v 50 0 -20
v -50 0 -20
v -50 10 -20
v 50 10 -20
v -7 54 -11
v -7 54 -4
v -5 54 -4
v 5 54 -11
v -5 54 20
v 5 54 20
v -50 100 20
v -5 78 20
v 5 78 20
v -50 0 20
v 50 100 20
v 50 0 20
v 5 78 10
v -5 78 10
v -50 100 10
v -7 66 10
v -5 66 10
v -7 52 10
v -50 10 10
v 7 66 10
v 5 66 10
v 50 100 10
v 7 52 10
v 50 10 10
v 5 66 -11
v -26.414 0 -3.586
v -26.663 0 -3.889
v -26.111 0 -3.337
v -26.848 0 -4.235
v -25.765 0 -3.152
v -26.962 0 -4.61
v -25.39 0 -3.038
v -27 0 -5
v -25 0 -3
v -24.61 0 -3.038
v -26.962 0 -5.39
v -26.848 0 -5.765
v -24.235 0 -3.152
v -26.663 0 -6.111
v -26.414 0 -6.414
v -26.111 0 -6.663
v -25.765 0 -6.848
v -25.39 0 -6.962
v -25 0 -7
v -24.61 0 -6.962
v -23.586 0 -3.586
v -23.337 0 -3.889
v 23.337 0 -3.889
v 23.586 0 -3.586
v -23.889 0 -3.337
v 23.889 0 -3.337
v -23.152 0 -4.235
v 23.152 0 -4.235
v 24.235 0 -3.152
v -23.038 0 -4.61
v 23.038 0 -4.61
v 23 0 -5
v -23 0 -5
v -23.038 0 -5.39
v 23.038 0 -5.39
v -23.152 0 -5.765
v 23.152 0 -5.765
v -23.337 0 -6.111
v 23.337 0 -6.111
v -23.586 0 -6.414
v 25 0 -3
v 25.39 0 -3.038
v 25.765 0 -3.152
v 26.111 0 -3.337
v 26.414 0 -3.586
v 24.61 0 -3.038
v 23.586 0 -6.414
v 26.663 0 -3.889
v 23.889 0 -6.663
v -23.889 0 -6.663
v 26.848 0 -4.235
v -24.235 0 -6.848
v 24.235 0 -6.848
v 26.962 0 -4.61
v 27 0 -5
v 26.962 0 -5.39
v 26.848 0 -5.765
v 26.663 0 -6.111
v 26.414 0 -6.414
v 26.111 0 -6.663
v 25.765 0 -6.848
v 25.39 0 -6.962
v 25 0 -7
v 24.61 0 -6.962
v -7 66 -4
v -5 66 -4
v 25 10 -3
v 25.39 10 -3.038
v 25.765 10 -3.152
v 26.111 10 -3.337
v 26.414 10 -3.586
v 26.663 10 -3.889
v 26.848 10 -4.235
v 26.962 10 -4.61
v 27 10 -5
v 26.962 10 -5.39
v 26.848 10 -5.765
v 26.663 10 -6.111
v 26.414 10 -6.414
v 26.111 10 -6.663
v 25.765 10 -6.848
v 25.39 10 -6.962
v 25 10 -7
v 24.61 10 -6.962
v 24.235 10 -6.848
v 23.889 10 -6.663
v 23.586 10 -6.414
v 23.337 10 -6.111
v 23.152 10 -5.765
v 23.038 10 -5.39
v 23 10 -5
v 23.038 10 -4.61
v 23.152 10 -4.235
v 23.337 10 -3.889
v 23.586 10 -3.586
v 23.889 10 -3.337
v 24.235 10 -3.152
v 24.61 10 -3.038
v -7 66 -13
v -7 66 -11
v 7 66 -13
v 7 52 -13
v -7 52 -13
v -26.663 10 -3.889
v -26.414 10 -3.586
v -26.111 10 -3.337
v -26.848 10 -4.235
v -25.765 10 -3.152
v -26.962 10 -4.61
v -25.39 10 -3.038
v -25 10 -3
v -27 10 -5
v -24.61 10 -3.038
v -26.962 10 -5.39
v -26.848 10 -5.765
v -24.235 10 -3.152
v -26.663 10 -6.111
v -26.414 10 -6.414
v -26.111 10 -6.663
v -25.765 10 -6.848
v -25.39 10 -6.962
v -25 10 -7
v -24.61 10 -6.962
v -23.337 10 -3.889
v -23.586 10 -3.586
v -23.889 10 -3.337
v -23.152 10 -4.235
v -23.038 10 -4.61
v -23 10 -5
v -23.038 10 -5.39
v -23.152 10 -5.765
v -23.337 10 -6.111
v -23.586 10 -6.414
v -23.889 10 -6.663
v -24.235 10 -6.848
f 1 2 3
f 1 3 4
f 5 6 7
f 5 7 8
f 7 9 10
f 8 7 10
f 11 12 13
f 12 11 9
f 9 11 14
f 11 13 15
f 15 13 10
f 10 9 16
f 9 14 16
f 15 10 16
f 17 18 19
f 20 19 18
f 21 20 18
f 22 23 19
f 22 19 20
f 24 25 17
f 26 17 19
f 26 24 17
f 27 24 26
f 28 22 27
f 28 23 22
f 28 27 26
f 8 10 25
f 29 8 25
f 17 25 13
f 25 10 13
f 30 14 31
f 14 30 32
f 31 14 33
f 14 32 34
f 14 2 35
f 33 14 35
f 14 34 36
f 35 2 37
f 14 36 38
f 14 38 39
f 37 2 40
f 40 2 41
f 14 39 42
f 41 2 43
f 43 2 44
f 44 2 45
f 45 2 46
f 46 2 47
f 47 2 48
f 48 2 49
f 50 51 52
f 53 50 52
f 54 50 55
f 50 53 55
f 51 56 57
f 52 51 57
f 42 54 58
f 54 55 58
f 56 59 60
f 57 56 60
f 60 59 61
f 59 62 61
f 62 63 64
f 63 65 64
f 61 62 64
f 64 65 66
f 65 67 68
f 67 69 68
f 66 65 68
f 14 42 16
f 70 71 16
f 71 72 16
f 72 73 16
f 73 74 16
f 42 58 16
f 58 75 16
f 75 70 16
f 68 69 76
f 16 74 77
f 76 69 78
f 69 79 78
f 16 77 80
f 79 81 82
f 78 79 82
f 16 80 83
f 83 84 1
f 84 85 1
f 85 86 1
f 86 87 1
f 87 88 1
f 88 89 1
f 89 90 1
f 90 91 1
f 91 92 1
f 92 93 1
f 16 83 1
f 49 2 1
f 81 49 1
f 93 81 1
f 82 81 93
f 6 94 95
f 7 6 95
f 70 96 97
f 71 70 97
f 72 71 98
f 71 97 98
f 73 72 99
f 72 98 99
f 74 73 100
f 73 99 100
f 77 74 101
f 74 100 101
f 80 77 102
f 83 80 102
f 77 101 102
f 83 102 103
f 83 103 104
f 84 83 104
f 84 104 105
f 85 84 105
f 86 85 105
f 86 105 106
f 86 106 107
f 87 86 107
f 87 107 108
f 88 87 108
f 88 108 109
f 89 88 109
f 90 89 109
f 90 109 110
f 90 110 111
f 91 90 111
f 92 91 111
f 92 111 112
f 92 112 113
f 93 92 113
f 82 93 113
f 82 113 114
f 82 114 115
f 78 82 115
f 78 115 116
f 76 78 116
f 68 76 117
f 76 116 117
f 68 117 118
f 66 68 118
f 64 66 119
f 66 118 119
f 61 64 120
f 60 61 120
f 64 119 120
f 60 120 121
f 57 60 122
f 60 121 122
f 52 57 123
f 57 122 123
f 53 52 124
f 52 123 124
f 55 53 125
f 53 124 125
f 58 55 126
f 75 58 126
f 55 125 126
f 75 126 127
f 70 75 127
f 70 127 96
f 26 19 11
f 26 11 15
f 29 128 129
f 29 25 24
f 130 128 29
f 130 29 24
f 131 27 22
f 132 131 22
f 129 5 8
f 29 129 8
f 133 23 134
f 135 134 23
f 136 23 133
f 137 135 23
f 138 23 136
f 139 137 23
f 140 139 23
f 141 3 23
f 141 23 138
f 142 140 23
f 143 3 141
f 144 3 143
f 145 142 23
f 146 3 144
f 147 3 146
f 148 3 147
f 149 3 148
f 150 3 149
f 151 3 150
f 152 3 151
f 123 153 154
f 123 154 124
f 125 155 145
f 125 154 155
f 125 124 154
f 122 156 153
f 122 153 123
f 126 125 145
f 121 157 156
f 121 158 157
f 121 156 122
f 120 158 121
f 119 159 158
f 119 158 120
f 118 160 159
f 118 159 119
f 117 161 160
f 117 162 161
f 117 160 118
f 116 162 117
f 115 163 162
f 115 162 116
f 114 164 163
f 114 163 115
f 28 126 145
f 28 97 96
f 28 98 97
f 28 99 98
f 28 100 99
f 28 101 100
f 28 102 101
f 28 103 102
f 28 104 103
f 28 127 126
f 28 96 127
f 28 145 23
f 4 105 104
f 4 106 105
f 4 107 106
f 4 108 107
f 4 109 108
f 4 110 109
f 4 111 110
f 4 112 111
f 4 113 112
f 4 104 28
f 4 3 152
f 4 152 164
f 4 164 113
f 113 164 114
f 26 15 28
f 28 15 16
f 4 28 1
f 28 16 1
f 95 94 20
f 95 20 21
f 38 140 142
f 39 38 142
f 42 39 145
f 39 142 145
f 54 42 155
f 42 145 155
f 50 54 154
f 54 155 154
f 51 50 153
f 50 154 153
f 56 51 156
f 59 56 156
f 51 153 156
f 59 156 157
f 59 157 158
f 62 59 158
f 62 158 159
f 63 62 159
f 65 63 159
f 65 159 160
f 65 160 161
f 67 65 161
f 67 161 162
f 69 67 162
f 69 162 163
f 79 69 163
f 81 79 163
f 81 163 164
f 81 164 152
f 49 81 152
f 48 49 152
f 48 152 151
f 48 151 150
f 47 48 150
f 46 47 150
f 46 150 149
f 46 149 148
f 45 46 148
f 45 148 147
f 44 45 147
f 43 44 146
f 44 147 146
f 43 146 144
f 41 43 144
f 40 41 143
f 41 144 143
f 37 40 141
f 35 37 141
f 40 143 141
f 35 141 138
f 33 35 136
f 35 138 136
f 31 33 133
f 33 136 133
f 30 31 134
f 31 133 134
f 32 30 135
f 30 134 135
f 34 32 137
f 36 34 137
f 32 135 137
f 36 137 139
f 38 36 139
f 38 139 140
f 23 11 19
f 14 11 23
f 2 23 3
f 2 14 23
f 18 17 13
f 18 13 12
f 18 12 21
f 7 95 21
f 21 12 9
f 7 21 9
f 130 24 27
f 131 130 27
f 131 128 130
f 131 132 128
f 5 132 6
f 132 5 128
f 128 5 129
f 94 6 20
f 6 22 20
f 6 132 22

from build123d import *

# Parameters (mm, degrees)
SKETCH3_W           = 100
SKETCH3_H           = 40
BOSS_EXTRUDE1_DEPTH = 10
SKETCH4_W           = 100
SKETCH4_H           = 10
BOSS_EXTRUDE2_DEPTH = 90
SKETCH5_R           = 2
CUT_EXTRUDE1_DEPTH  = 90
SKETCH7_W           = 10
SKETCH7_H           = 12
CUT_EXTRUDE3_DEPTH  = 10
BOSS_EXTRUDE3_DEPTH = 23
SKETCH9_W           = 10
SKETCH9_H           = 2
BOSS_EXTRUDE5_DEPTH = 12
SKETCH12_W          = 2
SKETCH12_H          = 7
CUT_EXTRUDE6_DEPTH  = 12
SKETCH13_W          = 10
SKETCH13_H          = 12
CUT_EXTRUDE7_DEPTH  = 10


with BuildPart() as part:
    # Sketch3 → Boss-Extrude1 (new body)
    with BuildSketch(Plane(origin=(0, 0, 0), x_dir=(1, 0, 0), z_dir=(0, 1, 0))):
        Rectangle(SKETCH3_W, SKETCH3_H)
    extrude(amount=BOSS_EXTRUDE1_DEPTH)

    # Sketch4 → Boss-Extrude2 (add)
    with BuildSketch(Plane(origin=(0, 10, 0), x_dir=(1, 0, 0), z_dir=(0, 1, 0))):
        with Locations((0, -15)):
            Rectangle(SKETCH4_W, SKETCH4_H)
    extrude(amount=BOSS_EXTRUDE2_DEPTH)

    # Sketch5 → Cut-Extrude1 (cut)
    with BuildSketch(Plane(origin=(0, 10, 0), x_dir=(1, 0, 0), z_dir=(0, 1, 0))):
        with Locations(Location((-25, 5, 0), (0, 0, 270))):
            Circle(SKETCH5_R)
        with Locations(Location((25, 5, 0), (0, 0, 270))):
            Circle(SKETCH5_R)
    extrude(amount=-CUT_EXTRUDE1_DEPTH, mode=Mode.SUBTRACT)

    # Sketch7 → Cut-Extrude3 (cut)
    with BuildSketch(Plane(origin=(0, 0, 10), x_dir=(-1, 0, 0), z_dir=(0, 0, -1))):
        with Locations((0, 60)):
            Rectangle(SKETCH7_W, SKETCH7_H)
    extrude(amount=-CUT_EXTRUDE3_DEPTH, mode=Mode.SUBTRACT)

    # Sketch8 → Boss-Extrude3 (add)
    with BuildSketch(Plane(origin=(0, 0, 10), x_dir=(-1, 0, 0), z_dir=(0, 0, -1))):
        Polygon((-5, 54), (-5, 66), (-7, 66), (-7, 52), (7, 52), (7, 66), (5, 66), (5, 54), align=None)
    extrude(amount=BOSS_EXTRUDE3_DEPTH)

    # Sketch9 → Boss-Extrude5 (add)
    with BuildSketch(Plane(origin=(0, 54, 0), x_dir=(1, 0, 0), z_dir=(0, 1, 0))):
        with Locations((0, 12)):
            Rectangle(SKETCH9_W, SKETCH9_H)
    extrude(amount=BOSS_EXTRUDE5_DEPTH)

    # Sketch12 → Cut-Extrude6 (cut)
    with BuildSketch(Plane(origin=(0, 66, 0), x_dir=(1, 0, 0), z_dir=(0, 1, 0))):
        with Locations((-6, 7.5)):
            Rectangle(SKETCH12_W, SKETCH12_H)
    extrude(amount=-CUT_EXTRUDE6_DEPTH, mode=Mode.SUBTRACT)

    # Sketch13 → Cut-Extrude7 (cut)
    with BuildSketch(Plane(origin=(0, 0, 10), x_dir=(-1, 0, 0), z_dir=(0, 0, -1))):
        with Locations((0, 72)):
            Rectangle(SKETCH13_W, SKETCH13_H)
    extrude(amount=-CUT_EXTRUDE7_DEPTH, mode=Mode.SUBTRACT)


solid = part.part
